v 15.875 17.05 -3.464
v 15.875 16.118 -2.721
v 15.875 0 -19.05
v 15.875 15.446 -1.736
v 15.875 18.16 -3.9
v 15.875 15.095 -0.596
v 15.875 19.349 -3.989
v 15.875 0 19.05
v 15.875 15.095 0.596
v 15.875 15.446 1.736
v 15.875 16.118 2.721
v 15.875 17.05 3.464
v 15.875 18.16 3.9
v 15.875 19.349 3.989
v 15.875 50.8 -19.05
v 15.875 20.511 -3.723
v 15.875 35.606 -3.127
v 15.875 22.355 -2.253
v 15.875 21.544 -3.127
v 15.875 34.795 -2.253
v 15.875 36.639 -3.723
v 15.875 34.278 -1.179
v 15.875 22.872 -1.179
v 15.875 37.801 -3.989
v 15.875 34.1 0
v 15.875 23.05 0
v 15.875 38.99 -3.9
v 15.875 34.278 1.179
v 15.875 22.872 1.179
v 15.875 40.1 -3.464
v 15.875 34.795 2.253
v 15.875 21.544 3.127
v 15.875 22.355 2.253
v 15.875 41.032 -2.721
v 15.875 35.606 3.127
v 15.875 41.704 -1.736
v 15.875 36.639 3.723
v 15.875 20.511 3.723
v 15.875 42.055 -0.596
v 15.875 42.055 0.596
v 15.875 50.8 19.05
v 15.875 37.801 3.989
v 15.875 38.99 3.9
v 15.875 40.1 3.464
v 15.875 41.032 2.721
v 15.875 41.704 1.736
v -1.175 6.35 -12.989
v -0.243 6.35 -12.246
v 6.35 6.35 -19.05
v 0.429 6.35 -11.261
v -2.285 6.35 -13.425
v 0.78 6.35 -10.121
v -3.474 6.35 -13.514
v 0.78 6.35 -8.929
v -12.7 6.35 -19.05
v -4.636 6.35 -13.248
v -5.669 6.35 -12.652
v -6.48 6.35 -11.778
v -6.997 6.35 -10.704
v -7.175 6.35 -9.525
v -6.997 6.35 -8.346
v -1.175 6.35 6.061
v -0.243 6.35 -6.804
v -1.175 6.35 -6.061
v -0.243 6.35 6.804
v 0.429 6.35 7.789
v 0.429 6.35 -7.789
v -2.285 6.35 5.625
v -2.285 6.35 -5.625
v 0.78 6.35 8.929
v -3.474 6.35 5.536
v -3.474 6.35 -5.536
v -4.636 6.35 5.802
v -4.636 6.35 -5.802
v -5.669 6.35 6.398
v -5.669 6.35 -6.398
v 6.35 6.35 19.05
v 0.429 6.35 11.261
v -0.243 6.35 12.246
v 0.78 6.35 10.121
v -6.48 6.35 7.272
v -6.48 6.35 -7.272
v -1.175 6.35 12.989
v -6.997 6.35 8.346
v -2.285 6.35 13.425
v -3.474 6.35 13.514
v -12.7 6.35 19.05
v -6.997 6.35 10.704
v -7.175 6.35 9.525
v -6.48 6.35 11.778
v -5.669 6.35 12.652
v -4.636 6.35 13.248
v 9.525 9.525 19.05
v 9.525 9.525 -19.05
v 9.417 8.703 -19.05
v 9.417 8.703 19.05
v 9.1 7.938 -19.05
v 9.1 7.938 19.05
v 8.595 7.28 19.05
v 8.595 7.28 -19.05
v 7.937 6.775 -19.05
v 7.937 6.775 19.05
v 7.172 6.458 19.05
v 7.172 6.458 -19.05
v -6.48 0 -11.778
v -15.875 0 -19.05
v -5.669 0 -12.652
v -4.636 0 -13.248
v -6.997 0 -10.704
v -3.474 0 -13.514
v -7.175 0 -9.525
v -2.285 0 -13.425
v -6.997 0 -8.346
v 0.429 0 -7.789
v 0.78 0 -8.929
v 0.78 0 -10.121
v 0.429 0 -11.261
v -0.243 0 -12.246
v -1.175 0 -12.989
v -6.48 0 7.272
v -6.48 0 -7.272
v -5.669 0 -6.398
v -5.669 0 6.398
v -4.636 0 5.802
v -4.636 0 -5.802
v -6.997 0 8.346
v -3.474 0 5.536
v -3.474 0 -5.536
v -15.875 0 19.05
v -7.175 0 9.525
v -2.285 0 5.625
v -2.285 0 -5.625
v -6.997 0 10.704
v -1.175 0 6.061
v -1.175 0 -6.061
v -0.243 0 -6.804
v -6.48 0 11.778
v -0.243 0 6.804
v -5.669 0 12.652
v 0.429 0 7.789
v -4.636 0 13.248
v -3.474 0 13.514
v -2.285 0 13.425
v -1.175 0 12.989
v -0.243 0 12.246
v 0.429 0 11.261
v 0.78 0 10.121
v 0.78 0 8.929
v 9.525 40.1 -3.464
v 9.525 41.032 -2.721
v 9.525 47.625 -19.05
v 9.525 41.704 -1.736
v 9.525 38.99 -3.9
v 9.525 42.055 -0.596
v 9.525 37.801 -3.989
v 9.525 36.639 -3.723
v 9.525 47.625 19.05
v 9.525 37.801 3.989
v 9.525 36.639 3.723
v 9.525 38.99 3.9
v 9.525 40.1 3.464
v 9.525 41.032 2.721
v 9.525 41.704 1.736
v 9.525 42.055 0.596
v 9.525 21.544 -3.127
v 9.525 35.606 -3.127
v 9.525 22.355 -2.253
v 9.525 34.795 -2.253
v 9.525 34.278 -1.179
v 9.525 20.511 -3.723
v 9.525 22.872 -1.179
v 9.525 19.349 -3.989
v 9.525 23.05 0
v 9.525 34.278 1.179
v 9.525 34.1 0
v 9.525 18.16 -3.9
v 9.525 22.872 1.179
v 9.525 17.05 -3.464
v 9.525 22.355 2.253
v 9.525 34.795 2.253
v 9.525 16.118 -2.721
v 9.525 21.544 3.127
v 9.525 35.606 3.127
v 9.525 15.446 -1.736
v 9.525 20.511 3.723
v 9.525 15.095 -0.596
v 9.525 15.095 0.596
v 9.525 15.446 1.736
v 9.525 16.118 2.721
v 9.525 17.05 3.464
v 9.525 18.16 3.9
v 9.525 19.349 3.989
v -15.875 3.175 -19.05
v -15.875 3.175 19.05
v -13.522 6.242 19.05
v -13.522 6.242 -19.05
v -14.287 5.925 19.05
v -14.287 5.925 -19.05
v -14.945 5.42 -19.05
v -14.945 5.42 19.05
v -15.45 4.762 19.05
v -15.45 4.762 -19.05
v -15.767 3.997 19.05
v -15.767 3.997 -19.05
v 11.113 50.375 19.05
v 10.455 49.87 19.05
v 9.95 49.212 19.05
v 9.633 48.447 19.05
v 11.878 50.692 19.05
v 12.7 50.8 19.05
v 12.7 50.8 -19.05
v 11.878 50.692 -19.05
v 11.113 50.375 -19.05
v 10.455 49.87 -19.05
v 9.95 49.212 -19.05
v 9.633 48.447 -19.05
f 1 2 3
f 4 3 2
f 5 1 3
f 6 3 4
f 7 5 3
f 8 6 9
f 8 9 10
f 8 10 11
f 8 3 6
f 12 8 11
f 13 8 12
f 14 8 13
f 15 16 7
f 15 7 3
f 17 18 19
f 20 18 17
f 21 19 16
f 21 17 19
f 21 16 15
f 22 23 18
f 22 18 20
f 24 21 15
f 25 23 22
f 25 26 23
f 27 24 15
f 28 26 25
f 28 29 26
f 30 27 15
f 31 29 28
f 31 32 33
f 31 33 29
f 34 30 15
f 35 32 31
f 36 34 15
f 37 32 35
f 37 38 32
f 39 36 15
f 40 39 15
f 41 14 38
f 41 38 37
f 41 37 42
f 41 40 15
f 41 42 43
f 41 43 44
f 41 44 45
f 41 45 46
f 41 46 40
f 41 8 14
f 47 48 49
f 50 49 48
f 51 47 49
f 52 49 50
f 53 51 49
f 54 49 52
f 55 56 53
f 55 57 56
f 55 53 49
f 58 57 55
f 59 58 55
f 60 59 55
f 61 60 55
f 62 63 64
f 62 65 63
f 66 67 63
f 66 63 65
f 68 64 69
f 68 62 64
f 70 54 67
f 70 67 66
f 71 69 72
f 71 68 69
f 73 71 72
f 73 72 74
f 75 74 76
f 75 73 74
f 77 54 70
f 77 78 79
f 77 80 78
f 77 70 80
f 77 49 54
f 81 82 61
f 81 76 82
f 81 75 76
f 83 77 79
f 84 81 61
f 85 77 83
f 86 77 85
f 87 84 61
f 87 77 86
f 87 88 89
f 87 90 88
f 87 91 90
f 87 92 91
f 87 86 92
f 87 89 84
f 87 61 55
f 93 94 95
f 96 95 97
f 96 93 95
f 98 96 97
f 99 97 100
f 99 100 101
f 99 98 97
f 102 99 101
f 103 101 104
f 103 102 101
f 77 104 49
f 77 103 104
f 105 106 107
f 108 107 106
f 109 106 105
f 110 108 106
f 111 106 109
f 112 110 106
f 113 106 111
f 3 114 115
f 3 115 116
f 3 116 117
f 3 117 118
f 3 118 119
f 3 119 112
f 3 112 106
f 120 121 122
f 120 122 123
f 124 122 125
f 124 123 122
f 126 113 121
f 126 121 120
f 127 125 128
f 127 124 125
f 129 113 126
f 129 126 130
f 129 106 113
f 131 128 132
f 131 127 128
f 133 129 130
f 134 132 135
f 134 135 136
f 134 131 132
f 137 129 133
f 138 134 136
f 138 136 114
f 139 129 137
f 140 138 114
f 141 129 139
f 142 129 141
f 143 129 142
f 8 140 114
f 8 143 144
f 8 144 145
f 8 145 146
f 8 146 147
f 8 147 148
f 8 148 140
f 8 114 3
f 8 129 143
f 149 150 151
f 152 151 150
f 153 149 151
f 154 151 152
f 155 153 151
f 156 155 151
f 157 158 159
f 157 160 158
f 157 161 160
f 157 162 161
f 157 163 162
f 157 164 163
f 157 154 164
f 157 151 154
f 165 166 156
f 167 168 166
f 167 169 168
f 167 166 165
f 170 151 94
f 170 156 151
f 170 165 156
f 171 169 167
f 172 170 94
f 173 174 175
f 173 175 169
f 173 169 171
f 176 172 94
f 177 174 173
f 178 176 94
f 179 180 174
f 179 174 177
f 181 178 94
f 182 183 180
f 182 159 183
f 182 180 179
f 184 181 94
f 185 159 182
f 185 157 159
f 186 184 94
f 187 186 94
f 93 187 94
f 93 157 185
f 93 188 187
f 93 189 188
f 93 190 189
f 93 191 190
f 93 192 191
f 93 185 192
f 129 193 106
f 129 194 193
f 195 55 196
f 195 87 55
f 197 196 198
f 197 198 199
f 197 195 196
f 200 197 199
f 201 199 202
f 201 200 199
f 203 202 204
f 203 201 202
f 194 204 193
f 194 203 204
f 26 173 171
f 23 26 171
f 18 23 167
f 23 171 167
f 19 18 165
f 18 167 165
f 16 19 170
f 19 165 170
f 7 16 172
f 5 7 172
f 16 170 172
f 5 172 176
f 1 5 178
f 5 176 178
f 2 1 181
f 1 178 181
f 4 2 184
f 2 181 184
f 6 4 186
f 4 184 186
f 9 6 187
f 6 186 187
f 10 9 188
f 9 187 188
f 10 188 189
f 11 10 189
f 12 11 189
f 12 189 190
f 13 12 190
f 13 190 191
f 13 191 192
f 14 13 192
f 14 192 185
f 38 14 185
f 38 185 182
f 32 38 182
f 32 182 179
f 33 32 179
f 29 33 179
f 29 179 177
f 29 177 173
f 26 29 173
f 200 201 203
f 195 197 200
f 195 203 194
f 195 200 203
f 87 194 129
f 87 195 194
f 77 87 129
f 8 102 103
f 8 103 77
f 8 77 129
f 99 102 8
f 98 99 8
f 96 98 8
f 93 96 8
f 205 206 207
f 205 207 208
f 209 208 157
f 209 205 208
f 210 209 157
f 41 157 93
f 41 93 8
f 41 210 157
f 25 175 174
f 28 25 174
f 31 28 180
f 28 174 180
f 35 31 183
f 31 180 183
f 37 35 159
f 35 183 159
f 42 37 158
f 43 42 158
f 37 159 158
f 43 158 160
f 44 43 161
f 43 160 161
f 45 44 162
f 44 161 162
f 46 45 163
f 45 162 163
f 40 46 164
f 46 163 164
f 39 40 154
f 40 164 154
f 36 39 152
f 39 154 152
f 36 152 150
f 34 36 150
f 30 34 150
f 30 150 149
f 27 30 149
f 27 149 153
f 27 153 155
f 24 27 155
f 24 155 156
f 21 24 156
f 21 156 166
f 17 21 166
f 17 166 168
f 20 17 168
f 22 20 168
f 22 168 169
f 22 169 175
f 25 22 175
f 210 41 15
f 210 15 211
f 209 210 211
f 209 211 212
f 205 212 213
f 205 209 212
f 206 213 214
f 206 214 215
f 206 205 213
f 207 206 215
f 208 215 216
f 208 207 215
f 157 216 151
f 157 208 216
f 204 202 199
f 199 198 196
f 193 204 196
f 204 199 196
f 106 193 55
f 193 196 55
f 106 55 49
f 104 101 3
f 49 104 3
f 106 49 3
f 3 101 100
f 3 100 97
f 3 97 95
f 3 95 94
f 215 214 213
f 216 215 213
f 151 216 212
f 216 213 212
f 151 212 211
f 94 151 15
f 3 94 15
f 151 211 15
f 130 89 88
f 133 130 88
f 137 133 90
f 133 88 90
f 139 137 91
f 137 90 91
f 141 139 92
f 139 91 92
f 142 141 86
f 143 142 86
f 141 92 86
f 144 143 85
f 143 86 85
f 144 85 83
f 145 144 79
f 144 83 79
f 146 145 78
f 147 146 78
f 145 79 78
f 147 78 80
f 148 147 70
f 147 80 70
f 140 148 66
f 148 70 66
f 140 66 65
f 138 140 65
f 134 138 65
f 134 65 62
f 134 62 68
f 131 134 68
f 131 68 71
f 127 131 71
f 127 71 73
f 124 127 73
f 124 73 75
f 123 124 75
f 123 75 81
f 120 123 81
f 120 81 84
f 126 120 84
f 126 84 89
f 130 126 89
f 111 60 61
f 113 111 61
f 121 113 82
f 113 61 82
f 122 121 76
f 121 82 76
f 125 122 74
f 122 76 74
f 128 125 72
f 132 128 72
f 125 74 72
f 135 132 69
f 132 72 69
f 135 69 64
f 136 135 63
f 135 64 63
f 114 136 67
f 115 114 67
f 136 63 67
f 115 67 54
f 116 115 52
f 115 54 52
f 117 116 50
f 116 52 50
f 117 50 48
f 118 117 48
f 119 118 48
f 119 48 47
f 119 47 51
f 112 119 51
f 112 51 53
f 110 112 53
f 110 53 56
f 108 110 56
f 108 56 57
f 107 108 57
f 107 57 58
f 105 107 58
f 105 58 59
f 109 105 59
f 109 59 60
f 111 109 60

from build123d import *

# Parameters (mm, degrees)
BOSS_EXTRUDE1_DEPTH = 19.05
SKETCH3_R           = 4
CUT_EXTRUDE1_DEPTH  = 51.899122045
SKETCH4_R           = 4
CUT_EXTRUDE2_DEPTH  = 60.905780189


with BuildPart() as part:
    # Sketch2 → Boss-Extrude1 (new, symmetric)
    with BuildSketch(Plane.XY):
        with BuildLine():
            Line((-15.875, 0), (15.875, 0))
            Line((15.875, 0), (15.875, 50.8))
            Line((15.875, 50.8), (12.7, 50.8))
            ThreePointArc((12.7, 50.8), (10.45493597, 49.87006403), (9.525, 47.625))
            Line((9.525, 47.625), (9.525, 9.525))
            ThreePointArc((9.525, 9.525), (8.59506403, 7.27993597), (6.35, 6.35))
            Line((6.35, 6.35), (-12.7, 6.35))
            ThreePointArc((-12.7, 6.35), (-14.94506403, 5.42006403), (-15.875, 3.175))
            Line((-15.875, 3.175), (-15.875, 0))
        make_face()
    extrude(amount=BOSS_EXTRUDE1_DEPTH, both=True)

    # Sketch3 → Cut-Extrude1 (cut, through all)
    with BuildSketch(Plane(origin=(0, 6.35, 0), x_dir=(1, 0, 0), z_dir=(0, 1, 0))):
        with Locations(Location((-3.175, 9.525, 0), (0, 0, 180))):
            Circle(SKETCH3_R)
        with Locations(Location((-3.175, -9.525, 0), (0, 0, 180))):
            Circle(SKETCH3_R)
    extrude(amount=-CUT_EXTRUDE1_DEPTH, mode=Mode.SUBTRACT)

    # Sketch4 → Cut-Extrude2 (cut, through all)
    with BuildSketch(Plane.ZY.offset(-9.525)):
        with Locations(Location((0, 38.1, 0), (0, 0, 270))):
            Circle(SKETCH4_R)
        with Locations(Location((0, 19.05, 0), (0, 0, 90))):
            Circle(SKETCH4_R)
    extrude(amount=-CUT_EXTRUDE2_DEPTH, mode=Mode.SUBTRACT)


solid = part.part
